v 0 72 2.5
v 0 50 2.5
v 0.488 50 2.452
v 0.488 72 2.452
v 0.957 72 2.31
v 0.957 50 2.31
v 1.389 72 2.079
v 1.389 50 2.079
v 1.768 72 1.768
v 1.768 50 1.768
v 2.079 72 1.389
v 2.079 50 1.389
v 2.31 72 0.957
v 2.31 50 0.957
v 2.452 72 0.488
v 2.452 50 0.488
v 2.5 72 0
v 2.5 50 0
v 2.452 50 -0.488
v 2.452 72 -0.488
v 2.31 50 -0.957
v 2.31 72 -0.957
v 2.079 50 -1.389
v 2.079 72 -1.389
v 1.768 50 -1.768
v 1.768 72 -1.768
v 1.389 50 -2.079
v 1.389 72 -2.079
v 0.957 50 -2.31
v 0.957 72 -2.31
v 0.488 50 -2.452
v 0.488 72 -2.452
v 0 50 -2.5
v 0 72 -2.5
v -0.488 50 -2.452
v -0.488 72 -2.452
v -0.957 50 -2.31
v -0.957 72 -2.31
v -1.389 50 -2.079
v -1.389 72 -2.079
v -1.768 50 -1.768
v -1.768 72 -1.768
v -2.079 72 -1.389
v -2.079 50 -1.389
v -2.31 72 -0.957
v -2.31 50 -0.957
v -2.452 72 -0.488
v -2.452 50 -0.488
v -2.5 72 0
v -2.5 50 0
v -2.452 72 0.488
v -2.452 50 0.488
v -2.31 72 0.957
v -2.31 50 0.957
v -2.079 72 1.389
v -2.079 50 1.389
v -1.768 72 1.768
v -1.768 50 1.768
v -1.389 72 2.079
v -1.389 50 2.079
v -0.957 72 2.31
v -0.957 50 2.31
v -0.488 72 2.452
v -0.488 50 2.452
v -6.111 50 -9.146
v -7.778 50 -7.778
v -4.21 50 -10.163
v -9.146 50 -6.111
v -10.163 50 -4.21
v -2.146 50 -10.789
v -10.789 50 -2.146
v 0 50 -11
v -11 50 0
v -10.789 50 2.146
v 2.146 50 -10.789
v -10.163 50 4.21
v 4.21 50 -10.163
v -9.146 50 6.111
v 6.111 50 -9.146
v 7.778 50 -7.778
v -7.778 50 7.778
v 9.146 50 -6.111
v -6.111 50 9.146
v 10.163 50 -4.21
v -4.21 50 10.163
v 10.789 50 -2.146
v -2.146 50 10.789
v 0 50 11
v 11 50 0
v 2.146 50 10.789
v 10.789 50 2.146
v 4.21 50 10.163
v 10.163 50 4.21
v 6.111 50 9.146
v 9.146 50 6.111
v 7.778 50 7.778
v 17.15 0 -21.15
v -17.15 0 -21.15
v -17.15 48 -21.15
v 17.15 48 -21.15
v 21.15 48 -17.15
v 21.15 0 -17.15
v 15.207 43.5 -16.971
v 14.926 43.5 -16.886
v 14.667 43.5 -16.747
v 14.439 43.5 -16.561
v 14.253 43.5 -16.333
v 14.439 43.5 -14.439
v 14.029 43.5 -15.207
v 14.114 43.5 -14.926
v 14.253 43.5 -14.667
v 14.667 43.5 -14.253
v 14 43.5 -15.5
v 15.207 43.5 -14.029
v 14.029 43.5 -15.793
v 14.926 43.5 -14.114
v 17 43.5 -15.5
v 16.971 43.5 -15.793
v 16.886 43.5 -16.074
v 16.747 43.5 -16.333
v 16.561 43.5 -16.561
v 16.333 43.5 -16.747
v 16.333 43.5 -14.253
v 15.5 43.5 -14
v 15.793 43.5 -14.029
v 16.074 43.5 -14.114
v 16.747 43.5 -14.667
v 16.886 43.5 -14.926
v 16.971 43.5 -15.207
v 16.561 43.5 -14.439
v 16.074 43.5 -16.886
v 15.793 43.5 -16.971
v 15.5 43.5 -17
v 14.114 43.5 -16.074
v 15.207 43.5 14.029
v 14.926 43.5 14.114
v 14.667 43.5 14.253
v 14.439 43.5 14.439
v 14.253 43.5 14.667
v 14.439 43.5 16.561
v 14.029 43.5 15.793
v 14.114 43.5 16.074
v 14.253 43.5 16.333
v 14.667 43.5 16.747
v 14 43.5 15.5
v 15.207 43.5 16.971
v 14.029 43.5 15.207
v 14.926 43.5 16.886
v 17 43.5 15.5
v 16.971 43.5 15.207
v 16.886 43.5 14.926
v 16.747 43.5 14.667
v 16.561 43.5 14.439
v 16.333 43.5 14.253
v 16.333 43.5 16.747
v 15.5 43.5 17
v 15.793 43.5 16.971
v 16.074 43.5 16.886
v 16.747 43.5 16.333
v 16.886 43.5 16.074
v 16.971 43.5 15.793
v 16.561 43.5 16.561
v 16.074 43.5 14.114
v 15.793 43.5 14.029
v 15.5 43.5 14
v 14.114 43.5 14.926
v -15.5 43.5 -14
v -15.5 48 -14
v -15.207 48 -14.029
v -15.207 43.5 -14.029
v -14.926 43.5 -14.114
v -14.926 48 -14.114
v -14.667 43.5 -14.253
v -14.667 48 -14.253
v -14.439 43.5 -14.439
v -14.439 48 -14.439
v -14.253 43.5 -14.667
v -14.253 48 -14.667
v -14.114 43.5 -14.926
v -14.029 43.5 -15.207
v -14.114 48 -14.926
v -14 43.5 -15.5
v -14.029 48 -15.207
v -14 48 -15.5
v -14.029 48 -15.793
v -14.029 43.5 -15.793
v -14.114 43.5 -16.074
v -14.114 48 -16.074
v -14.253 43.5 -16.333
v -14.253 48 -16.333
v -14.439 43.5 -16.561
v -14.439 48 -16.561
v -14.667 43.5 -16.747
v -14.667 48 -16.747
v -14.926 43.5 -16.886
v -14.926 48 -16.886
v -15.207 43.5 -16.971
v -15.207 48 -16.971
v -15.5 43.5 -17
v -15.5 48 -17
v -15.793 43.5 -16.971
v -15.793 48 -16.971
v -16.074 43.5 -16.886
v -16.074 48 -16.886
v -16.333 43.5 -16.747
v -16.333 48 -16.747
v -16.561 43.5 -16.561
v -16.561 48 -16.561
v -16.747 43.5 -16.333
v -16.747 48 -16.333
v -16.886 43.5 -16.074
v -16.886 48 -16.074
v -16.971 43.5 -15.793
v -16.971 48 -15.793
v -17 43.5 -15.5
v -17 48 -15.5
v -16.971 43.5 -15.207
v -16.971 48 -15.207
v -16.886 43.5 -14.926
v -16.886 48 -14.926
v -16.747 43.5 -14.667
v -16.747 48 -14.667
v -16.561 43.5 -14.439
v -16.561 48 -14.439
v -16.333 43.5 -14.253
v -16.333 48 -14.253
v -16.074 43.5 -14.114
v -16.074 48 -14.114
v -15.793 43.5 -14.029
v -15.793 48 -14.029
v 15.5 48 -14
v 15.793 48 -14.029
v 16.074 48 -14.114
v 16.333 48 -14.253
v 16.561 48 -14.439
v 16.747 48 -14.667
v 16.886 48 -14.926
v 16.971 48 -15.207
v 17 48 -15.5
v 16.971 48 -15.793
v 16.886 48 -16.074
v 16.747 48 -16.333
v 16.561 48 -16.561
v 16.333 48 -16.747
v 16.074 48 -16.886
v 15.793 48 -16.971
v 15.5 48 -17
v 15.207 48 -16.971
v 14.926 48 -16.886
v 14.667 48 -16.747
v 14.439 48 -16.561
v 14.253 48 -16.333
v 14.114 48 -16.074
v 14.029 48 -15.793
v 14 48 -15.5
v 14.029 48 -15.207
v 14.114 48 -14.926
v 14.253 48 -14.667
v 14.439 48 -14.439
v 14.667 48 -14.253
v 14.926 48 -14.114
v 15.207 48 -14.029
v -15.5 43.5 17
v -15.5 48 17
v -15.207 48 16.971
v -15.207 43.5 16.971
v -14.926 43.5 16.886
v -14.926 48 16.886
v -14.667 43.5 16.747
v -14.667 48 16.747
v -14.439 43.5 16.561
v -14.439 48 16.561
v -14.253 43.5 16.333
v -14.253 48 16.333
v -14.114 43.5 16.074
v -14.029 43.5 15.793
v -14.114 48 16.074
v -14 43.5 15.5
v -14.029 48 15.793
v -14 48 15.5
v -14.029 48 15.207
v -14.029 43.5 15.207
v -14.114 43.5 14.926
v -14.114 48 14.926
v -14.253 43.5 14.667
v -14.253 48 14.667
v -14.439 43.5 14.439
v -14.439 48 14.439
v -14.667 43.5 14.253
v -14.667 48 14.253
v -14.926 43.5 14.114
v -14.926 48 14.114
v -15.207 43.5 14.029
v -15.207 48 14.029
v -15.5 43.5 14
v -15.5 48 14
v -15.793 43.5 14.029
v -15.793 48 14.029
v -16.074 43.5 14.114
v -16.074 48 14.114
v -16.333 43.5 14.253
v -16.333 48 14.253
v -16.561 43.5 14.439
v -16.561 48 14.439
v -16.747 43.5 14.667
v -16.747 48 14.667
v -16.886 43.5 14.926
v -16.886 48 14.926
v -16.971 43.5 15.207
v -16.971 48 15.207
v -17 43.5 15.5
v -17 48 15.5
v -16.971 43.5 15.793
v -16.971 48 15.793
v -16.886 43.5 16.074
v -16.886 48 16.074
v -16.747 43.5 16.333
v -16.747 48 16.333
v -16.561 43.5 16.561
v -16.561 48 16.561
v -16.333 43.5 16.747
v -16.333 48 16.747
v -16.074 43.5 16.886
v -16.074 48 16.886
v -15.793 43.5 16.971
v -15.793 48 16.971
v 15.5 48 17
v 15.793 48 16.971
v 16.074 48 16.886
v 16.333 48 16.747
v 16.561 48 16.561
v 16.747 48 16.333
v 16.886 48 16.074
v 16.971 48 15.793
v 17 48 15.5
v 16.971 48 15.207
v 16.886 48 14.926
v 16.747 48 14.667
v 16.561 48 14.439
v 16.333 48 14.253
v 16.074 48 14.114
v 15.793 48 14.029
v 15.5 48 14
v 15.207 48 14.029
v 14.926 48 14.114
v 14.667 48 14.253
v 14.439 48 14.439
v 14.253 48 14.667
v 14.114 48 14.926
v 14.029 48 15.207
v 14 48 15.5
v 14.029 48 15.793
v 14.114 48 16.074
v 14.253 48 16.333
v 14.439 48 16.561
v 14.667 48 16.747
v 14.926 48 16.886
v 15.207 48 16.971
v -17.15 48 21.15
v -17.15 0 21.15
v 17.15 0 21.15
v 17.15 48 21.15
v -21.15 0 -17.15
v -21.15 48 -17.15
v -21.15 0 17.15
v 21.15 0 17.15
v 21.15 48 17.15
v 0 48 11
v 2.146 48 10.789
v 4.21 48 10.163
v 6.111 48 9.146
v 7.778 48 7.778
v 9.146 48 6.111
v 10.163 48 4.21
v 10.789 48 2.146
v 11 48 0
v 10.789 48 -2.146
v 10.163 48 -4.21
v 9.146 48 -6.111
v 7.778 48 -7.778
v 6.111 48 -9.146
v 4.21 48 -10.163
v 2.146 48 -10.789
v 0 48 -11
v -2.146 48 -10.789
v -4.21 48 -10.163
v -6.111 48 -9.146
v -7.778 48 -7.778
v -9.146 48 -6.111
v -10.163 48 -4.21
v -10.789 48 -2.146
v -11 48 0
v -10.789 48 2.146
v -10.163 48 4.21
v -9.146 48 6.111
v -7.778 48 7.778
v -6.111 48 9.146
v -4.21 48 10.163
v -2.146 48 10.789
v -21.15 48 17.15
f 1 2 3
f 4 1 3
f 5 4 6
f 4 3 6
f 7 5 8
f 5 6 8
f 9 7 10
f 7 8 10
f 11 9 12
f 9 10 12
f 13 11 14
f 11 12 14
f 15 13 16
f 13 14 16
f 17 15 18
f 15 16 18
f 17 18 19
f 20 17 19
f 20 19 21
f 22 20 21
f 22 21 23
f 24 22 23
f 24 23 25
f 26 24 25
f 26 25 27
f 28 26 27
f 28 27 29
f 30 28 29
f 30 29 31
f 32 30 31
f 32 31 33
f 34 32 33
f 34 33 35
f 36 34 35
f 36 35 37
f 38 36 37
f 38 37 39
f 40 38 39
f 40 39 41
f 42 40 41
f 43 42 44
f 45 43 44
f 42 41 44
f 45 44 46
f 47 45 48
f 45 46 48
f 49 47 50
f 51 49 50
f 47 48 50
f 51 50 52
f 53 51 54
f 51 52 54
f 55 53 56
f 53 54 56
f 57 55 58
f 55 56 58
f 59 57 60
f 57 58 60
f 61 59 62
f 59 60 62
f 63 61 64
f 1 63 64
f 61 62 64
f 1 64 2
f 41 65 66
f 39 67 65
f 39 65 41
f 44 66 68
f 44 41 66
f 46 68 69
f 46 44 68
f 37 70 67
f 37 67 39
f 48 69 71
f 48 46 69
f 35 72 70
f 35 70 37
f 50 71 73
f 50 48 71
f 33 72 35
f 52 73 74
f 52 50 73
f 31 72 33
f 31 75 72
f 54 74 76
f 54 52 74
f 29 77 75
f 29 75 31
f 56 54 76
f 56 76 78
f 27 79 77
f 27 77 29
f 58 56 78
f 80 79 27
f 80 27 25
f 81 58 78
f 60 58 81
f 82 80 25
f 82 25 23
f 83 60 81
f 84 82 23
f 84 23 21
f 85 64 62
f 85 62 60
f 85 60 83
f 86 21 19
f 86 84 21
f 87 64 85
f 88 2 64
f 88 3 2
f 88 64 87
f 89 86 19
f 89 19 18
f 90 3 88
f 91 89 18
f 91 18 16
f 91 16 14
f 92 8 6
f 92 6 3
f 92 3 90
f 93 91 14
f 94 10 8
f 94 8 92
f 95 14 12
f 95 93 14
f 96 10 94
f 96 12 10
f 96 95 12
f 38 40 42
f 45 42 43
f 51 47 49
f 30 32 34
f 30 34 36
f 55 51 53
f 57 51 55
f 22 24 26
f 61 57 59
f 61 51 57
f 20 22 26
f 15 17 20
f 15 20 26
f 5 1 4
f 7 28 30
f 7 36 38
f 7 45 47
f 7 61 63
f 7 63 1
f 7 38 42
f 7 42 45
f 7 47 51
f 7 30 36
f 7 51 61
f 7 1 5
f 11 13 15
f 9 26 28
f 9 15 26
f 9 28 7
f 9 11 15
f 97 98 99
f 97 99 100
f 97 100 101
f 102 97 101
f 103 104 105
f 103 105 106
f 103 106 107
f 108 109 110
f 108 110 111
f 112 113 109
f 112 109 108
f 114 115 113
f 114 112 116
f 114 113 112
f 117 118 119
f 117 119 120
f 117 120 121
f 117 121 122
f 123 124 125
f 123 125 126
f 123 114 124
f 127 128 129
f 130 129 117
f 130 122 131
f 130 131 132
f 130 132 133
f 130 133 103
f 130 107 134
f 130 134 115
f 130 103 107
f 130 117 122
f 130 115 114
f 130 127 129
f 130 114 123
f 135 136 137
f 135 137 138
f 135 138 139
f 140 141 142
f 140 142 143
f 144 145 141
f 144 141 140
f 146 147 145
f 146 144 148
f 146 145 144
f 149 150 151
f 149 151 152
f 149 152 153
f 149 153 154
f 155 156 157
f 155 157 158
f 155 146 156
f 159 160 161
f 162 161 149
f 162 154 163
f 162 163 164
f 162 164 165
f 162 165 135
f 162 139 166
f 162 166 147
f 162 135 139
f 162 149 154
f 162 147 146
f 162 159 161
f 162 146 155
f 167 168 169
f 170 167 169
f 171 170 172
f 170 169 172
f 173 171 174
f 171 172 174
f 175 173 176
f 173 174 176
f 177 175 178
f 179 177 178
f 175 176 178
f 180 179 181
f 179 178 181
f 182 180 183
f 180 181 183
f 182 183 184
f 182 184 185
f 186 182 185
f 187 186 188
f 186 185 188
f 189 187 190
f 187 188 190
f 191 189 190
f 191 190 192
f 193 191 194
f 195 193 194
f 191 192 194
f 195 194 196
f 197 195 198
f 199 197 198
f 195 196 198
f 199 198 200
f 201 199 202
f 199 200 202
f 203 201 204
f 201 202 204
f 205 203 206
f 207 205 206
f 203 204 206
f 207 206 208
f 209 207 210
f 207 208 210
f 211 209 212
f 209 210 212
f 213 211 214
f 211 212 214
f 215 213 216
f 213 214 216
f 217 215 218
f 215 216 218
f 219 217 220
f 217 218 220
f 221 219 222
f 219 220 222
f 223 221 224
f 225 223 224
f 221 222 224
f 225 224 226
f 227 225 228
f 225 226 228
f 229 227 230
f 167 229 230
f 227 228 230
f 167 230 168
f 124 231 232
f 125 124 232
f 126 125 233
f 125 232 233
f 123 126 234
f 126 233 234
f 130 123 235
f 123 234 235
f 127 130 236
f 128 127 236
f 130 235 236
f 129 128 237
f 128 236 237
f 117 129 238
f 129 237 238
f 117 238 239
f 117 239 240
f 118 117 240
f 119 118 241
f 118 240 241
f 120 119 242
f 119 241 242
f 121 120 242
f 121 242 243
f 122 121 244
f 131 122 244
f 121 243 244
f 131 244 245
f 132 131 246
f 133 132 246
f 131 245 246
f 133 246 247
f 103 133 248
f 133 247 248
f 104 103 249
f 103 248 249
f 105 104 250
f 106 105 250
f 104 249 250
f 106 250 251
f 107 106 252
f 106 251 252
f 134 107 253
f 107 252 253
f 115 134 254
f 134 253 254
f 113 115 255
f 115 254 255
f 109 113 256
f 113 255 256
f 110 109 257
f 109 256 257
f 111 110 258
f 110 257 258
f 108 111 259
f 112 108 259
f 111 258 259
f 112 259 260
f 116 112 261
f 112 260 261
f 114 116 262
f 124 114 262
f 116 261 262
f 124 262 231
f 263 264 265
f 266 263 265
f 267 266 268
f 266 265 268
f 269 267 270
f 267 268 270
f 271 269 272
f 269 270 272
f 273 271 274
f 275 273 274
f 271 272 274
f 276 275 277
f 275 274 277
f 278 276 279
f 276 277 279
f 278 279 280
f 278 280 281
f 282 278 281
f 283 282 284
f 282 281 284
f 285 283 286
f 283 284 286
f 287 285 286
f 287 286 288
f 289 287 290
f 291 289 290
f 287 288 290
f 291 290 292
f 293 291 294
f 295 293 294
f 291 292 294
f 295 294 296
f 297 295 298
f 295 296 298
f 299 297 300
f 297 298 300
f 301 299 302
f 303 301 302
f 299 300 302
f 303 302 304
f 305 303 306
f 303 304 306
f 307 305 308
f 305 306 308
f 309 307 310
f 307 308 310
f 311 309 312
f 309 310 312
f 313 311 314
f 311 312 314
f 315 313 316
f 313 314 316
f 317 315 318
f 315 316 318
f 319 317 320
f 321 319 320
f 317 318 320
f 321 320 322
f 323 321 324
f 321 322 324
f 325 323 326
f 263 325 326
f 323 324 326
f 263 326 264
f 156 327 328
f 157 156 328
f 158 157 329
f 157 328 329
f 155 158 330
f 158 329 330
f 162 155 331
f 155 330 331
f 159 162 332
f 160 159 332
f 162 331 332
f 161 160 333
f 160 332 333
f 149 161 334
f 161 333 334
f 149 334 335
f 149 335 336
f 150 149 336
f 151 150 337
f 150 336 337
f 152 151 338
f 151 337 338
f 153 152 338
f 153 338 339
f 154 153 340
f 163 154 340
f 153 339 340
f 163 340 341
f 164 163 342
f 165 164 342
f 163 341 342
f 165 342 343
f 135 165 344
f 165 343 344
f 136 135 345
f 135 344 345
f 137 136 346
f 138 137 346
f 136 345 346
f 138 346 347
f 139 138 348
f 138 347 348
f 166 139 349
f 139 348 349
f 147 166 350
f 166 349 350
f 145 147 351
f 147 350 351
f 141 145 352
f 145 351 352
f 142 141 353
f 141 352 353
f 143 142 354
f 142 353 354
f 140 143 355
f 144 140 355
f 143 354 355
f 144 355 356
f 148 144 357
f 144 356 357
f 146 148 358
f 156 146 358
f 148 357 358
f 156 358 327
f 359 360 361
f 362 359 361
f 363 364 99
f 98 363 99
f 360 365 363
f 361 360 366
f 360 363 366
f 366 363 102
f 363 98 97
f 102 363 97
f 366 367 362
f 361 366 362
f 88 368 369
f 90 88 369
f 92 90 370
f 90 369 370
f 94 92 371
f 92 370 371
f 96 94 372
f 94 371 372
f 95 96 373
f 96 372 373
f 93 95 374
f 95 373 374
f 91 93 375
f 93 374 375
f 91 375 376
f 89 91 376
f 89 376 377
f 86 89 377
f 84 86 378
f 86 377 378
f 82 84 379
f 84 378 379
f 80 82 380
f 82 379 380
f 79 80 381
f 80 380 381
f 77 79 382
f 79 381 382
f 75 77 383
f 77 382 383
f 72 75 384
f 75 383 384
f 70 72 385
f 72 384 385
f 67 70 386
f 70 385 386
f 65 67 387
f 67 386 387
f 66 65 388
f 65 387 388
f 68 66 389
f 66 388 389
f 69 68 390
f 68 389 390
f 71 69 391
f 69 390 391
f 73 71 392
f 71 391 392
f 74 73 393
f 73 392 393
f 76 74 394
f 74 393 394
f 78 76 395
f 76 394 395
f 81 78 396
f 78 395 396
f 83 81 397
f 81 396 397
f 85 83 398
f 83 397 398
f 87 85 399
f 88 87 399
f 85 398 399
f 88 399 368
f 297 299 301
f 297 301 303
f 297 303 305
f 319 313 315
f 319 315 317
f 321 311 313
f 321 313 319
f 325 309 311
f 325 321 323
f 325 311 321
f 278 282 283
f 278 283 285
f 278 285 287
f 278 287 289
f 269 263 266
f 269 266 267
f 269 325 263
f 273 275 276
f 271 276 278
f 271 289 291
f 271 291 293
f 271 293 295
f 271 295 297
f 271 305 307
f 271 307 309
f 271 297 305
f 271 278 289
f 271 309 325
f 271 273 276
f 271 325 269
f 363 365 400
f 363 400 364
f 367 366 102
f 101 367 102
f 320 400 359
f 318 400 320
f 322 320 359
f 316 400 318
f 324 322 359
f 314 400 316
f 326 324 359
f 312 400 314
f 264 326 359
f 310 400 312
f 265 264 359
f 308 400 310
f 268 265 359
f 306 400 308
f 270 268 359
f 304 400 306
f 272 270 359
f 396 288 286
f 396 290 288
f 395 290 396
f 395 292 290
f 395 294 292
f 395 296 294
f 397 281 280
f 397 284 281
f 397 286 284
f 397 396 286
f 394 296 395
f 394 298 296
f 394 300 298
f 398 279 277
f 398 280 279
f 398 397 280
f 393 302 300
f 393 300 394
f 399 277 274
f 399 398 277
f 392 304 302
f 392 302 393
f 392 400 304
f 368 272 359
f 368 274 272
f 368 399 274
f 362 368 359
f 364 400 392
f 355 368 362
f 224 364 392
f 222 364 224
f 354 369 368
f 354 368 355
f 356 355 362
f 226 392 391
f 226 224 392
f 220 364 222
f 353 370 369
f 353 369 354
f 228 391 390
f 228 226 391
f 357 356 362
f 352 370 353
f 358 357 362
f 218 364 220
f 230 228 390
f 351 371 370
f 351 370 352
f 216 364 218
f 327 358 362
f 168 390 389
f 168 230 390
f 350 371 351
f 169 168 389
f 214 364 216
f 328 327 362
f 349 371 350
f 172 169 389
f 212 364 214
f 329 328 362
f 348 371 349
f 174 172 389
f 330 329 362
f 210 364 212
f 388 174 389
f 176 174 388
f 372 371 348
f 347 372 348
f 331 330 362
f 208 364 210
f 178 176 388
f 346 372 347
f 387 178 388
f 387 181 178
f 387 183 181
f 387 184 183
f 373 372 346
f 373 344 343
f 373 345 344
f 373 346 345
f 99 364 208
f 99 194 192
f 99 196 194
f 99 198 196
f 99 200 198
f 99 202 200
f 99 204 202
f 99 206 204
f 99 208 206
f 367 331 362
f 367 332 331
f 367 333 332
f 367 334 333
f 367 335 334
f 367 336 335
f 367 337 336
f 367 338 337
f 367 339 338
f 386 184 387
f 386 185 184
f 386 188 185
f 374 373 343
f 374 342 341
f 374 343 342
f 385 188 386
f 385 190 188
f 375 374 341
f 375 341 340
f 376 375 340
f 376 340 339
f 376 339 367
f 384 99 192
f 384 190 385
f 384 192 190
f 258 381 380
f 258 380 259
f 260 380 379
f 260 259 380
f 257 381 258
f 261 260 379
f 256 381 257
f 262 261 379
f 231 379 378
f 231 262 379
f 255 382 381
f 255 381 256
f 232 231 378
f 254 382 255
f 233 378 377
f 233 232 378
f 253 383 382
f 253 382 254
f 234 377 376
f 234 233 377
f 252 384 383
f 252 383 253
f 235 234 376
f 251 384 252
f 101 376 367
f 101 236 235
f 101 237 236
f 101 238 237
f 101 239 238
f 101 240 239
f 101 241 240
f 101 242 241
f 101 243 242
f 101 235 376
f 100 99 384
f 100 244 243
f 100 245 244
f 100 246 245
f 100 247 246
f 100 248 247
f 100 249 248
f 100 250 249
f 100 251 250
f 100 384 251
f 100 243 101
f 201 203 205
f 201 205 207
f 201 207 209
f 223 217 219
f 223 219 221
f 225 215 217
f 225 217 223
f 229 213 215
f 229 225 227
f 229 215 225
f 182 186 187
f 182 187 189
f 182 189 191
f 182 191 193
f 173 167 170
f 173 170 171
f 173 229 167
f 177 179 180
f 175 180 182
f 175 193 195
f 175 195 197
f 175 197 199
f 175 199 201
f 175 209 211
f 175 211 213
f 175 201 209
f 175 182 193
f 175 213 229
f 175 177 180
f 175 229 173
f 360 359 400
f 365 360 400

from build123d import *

# Parameters (mm, degrees)
SKETCH1_W           = 42.3
SKETCH1_H           = 42.3
BOSS_EXTRUDE1_DEPTH = 48
CUT_EXTRUDE1_DEPTH  = 57.556564606
SKETCH2_3_R         = 1.5
CUT_EXTRUDE2_DEPTH  = 4.5
SKETCH2_4_R         = 11
BOSS_EXTRUDE2_DEPTH = 2
SKETCH2_5_R         = 2.5
BOSS_EXTRUDE3_DEPTH = 24


with BuildPart() as part:
    # Sketch1 → Boss-Extrude1 (new body)
    with BuildSketch(Plane(origin=(0, 0, 0), x_dir=(1, 0, 0), z_dir=(0, 1, 0))):
        Rectangle(SKETCH1_W, SKETCH1_H)
    extrude(amount=BOSS_EXTRUDE1_DEPTH)

    # Sketch2 → Cut-Extrude1 (cut, through all)
    with BuildSketch(Plane(origin=(0, 48, 0), x_dir=(1, 0, 0), z_dir=(0, 1, 0))):
        Polygon((-21.15, 21.15), (-21.15, 17.15), (-17.15, 21.15), align=None)
        Polygon((-17.15, -21.15), (-21.15, -17.15), (-21.15, -21.15), align=None)
        Polygon((21.15, 21.15), (17.15, 21.15), (21.15, 17.15), align=None)
        Polygon((21.15, -17.15), (17.15, -21.15), (21.15, -21.15), align=None)
    extrude(amount=-CUT_EXTRUDE1_DEPTH, mode=Mode.SUBTRACT)

    # Sketch2<3> → Cut-Extrude2 (cut)
    with BuildSketch(Plane(origin=(0, 48, 0), x_dir=(1, 0, 0), z_dir=(0, 1, 0))):
        with Locations((-15.5, 15.5)):
            Circle(SKETCH2_3_R)
        with Locations((15.5, 15.5)):
            Circle(SKETCH2_3_R)
        with Locations((15.5, -15.5)):
            Circle(SKETCH2_3_R)
        with Locations((-15.5, -15.5)):
            Circle(SKETCH2_3_R)
    extrude(amount=-CUT_EXTRUDE2_DEPTH, mode=Mode.SUBTRACT)

    # Sketch2<4> → Boss-Extrude2 (add)
    with BuildSketch(Plane(origin=(0, 48, 0), x_dir=(1, 0, 0), z_dir=(0, 1, 0))):
        Circle(SKETCH2_4_R)
    extrude(amount=BOSS_EXTRUDE2_DEPTH)

    # Sketch2<5> → Boss-Extrude3 (add)
    with BuildSketch(Plane(origin=(0, 48, 0), x_dir=(1, 0, 0), z_dir=(0, 1, 0))):
        Circle(SKETCH2_5_R)
    extrude(amount=BOSS_EXTRUDE3_DEPTH)


solid = part.part
